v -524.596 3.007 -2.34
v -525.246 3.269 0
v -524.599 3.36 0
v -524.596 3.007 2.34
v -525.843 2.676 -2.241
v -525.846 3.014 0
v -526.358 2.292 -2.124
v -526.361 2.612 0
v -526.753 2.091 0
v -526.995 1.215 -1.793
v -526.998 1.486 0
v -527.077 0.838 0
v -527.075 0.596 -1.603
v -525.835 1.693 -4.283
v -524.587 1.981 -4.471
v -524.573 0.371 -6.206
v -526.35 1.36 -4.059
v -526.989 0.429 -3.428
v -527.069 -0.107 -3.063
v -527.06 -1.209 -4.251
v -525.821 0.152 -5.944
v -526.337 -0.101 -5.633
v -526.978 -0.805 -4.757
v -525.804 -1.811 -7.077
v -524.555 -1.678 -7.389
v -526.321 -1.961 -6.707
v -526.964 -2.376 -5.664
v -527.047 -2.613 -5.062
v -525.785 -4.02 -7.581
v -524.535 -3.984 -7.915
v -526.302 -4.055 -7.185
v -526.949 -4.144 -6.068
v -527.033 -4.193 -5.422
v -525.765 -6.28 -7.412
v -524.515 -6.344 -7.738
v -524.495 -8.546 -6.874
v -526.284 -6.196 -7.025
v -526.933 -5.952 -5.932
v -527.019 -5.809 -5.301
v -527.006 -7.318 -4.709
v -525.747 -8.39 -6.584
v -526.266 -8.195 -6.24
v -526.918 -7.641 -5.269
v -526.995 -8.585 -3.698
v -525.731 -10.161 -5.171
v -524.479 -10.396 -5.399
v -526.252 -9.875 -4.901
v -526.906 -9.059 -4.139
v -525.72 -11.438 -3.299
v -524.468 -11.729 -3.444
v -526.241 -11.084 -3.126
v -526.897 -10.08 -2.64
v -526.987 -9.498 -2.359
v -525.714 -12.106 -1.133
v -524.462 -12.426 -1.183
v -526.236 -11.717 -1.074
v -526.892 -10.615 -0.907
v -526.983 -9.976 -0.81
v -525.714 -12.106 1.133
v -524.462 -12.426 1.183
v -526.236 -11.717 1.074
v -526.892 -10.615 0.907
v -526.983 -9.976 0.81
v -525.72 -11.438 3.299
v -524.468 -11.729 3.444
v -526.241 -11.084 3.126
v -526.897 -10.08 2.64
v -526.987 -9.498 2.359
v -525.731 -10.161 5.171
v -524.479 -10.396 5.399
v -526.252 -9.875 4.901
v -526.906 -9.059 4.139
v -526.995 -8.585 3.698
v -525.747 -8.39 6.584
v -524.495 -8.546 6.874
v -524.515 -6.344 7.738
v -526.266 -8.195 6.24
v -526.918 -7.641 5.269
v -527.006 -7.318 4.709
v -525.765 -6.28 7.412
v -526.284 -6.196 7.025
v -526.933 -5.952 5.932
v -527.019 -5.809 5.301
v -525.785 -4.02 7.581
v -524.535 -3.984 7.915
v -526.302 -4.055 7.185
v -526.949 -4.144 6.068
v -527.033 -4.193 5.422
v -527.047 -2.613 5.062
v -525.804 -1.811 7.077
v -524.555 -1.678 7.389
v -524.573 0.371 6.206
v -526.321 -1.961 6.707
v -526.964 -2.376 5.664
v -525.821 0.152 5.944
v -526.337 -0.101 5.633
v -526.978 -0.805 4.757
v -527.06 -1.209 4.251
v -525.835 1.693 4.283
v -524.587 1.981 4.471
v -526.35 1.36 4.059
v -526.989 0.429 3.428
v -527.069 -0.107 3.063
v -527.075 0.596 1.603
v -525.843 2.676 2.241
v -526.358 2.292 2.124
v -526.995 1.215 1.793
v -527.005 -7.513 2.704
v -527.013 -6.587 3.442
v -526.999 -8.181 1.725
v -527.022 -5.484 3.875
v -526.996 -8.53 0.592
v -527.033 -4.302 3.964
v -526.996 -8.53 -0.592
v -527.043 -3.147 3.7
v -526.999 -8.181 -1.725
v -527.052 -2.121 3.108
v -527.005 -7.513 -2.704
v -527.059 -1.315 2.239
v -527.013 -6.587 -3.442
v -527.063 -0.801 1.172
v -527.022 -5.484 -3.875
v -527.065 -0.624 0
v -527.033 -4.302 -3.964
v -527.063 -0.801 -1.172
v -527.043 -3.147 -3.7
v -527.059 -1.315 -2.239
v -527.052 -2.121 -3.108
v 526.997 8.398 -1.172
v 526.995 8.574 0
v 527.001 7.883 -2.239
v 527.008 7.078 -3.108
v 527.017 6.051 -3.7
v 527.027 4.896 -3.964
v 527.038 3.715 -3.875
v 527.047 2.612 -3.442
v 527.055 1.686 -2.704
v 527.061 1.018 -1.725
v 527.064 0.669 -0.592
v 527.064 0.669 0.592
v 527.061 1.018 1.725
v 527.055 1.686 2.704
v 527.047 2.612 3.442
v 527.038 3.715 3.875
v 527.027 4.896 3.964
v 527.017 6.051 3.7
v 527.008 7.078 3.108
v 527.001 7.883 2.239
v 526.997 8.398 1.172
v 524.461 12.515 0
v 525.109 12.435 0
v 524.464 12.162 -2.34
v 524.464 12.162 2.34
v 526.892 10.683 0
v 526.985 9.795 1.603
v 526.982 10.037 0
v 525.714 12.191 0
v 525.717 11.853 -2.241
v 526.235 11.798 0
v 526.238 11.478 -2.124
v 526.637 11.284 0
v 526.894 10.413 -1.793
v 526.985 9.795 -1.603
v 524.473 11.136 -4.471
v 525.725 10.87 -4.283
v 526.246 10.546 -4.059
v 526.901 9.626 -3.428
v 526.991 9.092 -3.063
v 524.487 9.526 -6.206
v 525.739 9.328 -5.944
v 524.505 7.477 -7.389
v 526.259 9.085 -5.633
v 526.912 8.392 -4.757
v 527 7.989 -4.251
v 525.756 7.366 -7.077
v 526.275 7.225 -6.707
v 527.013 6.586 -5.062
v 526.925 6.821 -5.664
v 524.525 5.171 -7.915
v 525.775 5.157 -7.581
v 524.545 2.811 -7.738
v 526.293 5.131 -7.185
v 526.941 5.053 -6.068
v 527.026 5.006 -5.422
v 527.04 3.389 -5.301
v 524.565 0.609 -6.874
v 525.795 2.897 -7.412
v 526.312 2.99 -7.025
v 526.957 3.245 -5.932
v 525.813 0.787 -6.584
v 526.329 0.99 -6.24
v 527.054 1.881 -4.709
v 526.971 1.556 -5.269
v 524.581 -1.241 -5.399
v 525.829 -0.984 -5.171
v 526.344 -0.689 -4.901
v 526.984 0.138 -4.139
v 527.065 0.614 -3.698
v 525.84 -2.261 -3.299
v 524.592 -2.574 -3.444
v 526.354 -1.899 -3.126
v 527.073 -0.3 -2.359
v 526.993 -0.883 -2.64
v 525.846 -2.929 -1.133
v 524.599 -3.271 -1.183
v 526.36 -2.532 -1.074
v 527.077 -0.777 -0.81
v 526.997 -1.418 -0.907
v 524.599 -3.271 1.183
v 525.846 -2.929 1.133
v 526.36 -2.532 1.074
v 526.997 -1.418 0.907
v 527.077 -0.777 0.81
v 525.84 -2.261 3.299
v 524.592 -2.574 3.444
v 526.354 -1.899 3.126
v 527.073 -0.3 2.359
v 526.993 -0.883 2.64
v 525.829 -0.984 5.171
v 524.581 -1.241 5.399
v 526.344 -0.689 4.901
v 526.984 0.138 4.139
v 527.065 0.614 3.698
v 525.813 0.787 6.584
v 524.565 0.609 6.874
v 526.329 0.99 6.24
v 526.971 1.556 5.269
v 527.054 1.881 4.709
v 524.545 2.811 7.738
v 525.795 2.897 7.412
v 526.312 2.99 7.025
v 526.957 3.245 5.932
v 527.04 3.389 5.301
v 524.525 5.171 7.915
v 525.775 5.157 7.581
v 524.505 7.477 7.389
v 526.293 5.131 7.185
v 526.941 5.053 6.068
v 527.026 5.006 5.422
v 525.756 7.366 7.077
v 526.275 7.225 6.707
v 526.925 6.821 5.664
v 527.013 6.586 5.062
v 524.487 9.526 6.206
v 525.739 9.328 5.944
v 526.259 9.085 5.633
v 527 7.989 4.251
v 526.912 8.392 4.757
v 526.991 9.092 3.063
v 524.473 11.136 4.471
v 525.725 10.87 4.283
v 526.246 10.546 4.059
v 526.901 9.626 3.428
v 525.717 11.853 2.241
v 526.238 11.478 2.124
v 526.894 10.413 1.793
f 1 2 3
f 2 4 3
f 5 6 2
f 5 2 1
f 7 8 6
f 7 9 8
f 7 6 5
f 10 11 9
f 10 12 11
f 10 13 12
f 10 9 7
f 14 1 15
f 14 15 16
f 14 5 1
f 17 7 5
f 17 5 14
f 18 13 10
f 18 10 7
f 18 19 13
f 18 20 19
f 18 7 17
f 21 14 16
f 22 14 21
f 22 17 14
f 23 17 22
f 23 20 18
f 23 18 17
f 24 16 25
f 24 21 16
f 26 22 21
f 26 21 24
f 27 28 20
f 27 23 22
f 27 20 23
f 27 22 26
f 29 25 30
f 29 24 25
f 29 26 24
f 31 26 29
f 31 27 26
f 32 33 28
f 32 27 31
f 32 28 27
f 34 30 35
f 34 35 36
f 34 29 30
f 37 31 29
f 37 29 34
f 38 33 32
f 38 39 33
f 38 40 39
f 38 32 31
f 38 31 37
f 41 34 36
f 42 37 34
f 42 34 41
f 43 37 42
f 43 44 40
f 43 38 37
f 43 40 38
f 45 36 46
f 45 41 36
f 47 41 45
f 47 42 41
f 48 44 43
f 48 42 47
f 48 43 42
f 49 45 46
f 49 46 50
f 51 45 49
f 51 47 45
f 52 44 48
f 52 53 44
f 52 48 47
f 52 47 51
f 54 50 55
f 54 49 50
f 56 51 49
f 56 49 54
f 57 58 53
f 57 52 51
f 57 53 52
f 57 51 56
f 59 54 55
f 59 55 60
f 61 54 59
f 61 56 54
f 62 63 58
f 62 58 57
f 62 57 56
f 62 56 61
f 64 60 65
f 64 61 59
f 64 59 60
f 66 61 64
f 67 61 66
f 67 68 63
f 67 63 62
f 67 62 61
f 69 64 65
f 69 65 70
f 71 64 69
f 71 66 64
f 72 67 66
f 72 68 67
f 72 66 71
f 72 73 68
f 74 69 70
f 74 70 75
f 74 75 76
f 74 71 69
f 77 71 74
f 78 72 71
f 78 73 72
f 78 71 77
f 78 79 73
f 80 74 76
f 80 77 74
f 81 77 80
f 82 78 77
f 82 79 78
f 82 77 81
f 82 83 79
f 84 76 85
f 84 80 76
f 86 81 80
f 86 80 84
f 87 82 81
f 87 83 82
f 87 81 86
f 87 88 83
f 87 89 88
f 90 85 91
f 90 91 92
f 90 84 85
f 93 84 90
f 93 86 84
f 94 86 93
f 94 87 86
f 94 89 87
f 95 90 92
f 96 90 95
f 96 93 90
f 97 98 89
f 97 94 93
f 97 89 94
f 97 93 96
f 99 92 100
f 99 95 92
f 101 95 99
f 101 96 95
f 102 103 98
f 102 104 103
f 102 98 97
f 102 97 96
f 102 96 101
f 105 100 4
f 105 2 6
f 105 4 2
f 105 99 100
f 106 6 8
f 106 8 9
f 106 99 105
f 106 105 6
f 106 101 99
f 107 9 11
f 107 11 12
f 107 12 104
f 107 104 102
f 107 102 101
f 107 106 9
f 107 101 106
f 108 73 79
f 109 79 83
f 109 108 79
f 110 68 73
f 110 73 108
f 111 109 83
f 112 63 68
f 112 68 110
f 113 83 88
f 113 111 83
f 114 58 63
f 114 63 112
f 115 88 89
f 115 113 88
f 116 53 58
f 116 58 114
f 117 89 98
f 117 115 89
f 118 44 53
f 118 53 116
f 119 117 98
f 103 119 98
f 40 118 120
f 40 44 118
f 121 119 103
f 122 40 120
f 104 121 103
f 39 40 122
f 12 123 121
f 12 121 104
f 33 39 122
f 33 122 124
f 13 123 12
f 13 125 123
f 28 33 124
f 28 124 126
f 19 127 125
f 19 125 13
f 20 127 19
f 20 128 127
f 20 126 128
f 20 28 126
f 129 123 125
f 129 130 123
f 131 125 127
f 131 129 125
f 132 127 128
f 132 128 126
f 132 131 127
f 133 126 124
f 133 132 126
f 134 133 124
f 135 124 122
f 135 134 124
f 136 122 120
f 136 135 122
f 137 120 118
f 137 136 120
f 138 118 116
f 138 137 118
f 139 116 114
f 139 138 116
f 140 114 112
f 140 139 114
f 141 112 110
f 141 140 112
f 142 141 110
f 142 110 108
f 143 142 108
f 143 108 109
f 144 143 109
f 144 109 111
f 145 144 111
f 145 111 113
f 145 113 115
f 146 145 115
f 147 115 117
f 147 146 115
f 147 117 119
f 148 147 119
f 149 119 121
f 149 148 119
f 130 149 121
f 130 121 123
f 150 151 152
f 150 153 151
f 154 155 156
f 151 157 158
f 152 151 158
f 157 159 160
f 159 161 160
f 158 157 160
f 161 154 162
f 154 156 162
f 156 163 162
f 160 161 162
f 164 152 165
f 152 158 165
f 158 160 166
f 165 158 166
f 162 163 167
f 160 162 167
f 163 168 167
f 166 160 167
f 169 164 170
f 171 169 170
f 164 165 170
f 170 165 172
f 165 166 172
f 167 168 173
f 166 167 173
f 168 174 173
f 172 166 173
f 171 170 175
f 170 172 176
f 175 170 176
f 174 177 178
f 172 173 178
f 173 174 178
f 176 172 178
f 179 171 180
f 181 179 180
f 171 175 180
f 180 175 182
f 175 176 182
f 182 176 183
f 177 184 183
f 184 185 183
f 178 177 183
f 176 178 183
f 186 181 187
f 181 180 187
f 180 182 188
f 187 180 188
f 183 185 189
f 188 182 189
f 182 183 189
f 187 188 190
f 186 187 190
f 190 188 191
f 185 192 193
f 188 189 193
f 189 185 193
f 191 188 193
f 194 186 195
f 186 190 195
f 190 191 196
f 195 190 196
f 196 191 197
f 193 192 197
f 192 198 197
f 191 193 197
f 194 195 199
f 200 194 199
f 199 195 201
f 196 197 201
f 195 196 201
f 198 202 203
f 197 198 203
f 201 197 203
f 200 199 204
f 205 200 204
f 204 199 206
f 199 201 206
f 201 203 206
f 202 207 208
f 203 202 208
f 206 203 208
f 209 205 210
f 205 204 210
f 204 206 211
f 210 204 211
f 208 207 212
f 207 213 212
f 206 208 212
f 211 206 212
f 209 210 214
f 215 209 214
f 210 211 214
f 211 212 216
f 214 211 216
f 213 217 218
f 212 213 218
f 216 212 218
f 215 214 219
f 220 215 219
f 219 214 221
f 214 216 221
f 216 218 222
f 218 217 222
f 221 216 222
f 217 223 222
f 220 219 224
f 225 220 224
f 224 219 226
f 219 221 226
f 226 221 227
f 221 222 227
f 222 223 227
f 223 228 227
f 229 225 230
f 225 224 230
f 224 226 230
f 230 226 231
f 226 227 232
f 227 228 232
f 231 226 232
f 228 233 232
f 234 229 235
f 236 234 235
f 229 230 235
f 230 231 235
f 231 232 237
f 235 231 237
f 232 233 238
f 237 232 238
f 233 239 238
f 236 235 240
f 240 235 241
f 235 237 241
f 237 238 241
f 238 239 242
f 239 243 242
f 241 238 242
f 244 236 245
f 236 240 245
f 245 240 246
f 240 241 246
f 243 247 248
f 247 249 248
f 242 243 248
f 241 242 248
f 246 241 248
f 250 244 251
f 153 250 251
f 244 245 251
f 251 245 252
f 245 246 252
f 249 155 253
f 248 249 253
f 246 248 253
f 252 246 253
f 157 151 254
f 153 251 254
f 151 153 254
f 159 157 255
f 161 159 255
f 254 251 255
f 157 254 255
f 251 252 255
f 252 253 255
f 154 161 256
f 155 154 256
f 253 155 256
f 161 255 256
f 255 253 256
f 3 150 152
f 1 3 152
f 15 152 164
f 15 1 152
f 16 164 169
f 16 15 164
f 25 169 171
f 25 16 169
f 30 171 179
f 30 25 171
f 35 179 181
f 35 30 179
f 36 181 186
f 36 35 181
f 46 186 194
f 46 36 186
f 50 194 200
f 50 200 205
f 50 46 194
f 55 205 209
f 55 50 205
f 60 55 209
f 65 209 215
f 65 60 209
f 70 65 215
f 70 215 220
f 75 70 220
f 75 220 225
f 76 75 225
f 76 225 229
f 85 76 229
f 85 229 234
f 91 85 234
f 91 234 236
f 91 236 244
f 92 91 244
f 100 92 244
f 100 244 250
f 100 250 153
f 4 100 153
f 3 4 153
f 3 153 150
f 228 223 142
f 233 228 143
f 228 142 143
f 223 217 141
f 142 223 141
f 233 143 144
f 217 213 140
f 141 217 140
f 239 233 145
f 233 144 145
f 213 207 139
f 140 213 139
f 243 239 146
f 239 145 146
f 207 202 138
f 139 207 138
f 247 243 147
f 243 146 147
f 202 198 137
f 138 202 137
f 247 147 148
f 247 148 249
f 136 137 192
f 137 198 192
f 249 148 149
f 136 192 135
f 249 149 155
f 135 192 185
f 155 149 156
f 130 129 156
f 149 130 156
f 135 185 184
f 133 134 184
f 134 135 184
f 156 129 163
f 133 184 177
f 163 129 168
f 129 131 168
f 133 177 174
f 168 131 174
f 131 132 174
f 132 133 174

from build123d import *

# Parameters (mm, degrees)
SKETCH_1_R        = 7.9375
SKETCH_1_R_2      = 3.975
EXTRUDE_1_DEPTH   = 527.05
FILLET_1_R        = 2.5
MOVE_BODY_1_ANGLE = 90.5


with BuildPart() as part:
    # 스케치1 → 보스-돌출1 (new body, symmetric)
    with BuildSketch(Plane(origin=(0, 0, 0), x_dir=(1, 0, 0), z_dir=(0, 1, 0))):
        Circle(SKETCH_1_R)
        Circle(SKETCH_1_R_2, mode=Mode.SUBTRACT)
    extrude(amount=EXTRUDE_1_DEPTH, both=True)

    # 필렛1
    fillet_1_edges = [part.edges().sort_by_distance(p)[0] for p in [
        (-7.9375, -527.05, 0),
        (-7.9375, 527.05, 0),
    ]]
    fillet(fillet_1_edges, radius=FILLET_1_R)


with BuildPart() as part_1:
    # Move Body 1: moved
    add(part.part.rotate(Axis((0, 0, 0), (0, 0, 1)), MOVE_BODY_1_ANGLE))


solid = part_1.part
